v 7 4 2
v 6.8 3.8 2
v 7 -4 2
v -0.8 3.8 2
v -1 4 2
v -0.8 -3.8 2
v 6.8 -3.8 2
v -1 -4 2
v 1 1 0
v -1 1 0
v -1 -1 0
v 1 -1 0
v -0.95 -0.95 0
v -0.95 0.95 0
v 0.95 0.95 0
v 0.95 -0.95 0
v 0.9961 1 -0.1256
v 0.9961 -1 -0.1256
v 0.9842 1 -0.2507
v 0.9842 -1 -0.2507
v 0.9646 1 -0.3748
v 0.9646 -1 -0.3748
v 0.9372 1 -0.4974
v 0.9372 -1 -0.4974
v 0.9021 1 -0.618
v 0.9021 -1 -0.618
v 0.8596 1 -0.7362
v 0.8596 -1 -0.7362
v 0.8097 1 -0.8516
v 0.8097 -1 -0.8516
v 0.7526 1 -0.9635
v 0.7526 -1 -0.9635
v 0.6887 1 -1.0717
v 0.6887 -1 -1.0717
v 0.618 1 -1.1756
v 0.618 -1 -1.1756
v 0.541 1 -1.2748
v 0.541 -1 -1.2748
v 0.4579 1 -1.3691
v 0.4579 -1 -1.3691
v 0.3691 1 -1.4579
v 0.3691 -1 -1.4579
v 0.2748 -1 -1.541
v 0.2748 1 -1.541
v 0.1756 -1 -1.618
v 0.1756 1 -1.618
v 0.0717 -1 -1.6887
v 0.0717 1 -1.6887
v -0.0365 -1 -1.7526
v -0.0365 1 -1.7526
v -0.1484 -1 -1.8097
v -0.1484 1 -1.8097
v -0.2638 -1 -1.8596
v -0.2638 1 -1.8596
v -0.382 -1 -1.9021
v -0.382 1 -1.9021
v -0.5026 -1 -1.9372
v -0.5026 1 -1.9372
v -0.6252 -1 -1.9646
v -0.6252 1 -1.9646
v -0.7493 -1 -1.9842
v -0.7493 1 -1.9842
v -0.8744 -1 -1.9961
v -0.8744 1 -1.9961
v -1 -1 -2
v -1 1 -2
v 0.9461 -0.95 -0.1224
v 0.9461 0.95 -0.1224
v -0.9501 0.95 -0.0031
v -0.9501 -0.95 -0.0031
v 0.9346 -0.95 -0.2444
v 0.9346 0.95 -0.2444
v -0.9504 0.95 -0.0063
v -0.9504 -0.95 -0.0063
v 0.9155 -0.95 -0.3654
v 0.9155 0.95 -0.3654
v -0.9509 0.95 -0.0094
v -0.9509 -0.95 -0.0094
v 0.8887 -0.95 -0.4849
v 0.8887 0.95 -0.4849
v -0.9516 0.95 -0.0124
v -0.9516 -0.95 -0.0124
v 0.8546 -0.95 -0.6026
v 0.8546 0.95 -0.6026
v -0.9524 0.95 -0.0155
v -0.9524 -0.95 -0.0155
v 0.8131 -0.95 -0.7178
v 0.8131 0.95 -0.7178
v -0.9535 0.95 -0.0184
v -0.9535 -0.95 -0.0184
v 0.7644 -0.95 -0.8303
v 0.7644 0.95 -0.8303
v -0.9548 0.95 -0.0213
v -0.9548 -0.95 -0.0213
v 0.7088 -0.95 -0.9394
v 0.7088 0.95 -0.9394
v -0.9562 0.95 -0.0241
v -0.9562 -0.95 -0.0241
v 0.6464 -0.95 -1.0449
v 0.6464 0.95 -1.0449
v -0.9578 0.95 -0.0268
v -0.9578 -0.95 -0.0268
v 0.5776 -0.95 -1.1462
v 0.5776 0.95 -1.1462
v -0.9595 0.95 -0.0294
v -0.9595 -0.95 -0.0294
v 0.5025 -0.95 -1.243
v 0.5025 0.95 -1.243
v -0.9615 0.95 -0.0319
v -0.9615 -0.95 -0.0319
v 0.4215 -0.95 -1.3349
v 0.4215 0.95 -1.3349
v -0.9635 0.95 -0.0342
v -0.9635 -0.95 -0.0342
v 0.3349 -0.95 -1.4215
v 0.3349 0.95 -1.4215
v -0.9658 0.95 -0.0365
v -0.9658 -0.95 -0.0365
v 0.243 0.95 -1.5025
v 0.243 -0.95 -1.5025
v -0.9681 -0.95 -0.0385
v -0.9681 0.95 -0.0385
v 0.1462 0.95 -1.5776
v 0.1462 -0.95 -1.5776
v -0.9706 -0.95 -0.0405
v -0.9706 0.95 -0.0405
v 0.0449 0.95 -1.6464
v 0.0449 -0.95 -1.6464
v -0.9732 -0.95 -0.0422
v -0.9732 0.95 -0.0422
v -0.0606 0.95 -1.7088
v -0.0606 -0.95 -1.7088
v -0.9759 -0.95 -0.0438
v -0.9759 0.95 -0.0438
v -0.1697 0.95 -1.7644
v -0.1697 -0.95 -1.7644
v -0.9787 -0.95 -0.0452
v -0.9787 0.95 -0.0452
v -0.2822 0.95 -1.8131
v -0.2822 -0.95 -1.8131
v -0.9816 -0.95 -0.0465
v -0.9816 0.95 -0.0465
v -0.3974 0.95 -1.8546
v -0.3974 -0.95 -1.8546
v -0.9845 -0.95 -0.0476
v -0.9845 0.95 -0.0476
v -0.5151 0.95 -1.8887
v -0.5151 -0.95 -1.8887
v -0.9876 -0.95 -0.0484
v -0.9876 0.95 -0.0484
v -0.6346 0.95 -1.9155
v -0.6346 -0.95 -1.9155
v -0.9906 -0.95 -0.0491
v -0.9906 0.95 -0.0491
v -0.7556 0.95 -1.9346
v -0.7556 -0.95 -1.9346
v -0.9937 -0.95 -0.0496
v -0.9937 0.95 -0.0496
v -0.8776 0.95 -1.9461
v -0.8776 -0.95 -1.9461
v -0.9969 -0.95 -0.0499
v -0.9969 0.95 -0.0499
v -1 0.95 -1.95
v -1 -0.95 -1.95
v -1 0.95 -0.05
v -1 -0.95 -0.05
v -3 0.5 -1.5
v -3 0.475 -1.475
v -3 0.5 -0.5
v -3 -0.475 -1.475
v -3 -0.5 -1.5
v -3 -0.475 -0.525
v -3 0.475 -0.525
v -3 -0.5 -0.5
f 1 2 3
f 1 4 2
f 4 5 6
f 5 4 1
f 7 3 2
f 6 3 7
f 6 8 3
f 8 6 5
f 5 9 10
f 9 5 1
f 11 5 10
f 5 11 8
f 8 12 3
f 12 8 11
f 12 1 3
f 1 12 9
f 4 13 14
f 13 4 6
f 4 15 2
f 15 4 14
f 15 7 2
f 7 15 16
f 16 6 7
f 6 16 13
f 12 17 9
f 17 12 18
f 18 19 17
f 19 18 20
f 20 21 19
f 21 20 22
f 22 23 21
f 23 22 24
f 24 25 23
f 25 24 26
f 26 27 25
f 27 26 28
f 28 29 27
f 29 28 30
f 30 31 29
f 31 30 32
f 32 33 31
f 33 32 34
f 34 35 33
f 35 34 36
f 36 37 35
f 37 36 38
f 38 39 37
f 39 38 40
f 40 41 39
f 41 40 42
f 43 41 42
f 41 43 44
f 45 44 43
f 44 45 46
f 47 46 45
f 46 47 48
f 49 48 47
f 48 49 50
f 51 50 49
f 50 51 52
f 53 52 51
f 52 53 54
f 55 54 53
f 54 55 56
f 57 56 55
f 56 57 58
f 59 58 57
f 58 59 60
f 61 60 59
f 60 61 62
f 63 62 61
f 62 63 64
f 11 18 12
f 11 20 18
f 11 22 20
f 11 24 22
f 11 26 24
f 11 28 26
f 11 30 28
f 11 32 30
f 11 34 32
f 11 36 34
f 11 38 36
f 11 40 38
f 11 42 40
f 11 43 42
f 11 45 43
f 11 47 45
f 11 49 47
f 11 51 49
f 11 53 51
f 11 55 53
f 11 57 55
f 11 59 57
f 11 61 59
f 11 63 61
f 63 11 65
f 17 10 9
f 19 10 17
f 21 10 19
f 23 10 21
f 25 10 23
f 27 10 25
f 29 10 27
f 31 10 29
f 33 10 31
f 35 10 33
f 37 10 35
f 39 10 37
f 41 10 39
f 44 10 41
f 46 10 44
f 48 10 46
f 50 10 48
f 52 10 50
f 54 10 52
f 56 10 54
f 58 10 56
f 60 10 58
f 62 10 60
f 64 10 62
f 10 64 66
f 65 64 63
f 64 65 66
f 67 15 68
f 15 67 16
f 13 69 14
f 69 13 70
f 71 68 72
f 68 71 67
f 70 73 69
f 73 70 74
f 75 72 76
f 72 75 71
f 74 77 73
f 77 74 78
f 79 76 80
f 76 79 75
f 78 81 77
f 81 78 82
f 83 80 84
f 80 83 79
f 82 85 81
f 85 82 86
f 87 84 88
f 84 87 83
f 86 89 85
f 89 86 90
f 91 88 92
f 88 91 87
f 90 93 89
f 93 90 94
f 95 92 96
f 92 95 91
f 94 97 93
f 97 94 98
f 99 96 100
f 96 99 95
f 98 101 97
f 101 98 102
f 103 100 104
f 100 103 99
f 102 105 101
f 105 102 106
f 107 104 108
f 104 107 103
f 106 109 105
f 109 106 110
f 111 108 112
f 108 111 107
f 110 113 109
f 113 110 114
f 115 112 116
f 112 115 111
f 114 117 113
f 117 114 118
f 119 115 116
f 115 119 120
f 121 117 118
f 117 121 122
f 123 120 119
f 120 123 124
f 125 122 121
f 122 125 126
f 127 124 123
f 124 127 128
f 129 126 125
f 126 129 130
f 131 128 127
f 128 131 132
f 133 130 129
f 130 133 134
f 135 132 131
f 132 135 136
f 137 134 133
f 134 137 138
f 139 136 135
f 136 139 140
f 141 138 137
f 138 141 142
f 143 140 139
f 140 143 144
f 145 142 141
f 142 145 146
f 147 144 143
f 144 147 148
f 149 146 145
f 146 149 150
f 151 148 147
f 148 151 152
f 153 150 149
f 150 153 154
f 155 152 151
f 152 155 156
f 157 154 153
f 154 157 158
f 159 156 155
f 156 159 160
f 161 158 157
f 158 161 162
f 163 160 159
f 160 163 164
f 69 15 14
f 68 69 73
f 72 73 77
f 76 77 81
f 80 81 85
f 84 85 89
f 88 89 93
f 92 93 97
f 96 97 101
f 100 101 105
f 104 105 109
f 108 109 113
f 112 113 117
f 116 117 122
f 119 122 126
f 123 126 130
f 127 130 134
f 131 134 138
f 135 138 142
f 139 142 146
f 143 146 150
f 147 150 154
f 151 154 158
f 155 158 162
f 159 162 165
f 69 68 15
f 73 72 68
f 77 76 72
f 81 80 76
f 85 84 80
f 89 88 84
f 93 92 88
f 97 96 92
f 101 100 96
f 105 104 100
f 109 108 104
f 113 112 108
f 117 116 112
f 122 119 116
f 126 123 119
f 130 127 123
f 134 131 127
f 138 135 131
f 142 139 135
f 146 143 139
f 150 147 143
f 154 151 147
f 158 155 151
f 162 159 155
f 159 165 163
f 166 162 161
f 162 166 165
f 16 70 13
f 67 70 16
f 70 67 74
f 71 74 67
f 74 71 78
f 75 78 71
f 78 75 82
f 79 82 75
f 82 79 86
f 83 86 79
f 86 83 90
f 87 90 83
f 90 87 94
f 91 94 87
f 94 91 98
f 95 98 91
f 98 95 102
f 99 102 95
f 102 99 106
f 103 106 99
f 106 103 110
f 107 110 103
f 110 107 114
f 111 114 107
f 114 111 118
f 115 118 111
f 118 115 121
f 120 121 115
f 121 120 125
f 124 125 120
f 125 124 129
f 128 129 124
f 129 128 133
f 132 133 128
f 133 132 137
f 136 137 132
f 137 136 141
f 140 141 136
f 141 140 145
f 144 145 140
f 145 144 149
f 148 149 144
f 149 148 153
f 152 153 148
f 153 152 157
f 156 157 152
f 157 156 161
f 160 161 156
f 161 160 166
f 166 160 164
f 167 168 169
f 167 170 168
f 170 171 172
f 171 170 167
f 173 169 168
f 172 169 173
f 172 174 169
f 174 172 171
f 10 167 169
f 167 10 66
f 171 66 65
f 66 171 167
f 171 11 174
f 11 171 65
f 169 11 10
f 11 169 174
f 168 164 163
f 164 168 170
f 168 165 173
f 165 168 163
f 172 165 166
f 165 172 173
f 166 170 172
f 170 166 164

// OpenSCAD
funnelWidth = 2; //2 or 3 times 6.35 mm, or 1/2 inch
funnelHeight = 0.5;
funnelThickness=0.05;
extrudeHeight = 2;

module shearX_Z(s) {
    multmatrix([
        [1, 0, s, 0],
        [0, 1, 0, 0],
        [0, 0, 1, 0]
    ])
    children();
}

module funnelCupFrame(w,h,t,e){
    translate([0,0,e/2])
    linear_extrude(height = e,convexity = 3, scale=4,center=true)
    difference() {
        square([w,w],center=true);
        offset(delta = -t) square([w,w],center=true);
    }
}

module funnelOutlet (w,t){
    translate([-w/2,0,0])
    rotate([-90,0,0])
    translate([0,0,-w/2])
    rotate_extrude(angle=90, convexity=10,$fn=100) 
    difference() {
        square([w,w]);
        offset(delta = -t) square([w,w]);
    }
    
}

module outletPipe(w,t,e){
    translate([-w/2,0,-w/2])
    rotate([0,-90,0]) 
    linear_extrude(height = e, scale = 0.5)
    difference() {
        square([w,w],center=true);
        offset(delta = -t) square([w,w],center=true);
    }
}


module funnel() {

shearX_Z(1.5)
funnelCupFrame(w=funnelWidth,h=funnelHeight,t=funnelThickness, e= extrudeHeight);

funnelOutlet(w=funnelWidth, t=funnelThickness);

outletPipe(w=funnelWidth, t=funnelThickness, e= extrudeHeight);

}

funnel();
